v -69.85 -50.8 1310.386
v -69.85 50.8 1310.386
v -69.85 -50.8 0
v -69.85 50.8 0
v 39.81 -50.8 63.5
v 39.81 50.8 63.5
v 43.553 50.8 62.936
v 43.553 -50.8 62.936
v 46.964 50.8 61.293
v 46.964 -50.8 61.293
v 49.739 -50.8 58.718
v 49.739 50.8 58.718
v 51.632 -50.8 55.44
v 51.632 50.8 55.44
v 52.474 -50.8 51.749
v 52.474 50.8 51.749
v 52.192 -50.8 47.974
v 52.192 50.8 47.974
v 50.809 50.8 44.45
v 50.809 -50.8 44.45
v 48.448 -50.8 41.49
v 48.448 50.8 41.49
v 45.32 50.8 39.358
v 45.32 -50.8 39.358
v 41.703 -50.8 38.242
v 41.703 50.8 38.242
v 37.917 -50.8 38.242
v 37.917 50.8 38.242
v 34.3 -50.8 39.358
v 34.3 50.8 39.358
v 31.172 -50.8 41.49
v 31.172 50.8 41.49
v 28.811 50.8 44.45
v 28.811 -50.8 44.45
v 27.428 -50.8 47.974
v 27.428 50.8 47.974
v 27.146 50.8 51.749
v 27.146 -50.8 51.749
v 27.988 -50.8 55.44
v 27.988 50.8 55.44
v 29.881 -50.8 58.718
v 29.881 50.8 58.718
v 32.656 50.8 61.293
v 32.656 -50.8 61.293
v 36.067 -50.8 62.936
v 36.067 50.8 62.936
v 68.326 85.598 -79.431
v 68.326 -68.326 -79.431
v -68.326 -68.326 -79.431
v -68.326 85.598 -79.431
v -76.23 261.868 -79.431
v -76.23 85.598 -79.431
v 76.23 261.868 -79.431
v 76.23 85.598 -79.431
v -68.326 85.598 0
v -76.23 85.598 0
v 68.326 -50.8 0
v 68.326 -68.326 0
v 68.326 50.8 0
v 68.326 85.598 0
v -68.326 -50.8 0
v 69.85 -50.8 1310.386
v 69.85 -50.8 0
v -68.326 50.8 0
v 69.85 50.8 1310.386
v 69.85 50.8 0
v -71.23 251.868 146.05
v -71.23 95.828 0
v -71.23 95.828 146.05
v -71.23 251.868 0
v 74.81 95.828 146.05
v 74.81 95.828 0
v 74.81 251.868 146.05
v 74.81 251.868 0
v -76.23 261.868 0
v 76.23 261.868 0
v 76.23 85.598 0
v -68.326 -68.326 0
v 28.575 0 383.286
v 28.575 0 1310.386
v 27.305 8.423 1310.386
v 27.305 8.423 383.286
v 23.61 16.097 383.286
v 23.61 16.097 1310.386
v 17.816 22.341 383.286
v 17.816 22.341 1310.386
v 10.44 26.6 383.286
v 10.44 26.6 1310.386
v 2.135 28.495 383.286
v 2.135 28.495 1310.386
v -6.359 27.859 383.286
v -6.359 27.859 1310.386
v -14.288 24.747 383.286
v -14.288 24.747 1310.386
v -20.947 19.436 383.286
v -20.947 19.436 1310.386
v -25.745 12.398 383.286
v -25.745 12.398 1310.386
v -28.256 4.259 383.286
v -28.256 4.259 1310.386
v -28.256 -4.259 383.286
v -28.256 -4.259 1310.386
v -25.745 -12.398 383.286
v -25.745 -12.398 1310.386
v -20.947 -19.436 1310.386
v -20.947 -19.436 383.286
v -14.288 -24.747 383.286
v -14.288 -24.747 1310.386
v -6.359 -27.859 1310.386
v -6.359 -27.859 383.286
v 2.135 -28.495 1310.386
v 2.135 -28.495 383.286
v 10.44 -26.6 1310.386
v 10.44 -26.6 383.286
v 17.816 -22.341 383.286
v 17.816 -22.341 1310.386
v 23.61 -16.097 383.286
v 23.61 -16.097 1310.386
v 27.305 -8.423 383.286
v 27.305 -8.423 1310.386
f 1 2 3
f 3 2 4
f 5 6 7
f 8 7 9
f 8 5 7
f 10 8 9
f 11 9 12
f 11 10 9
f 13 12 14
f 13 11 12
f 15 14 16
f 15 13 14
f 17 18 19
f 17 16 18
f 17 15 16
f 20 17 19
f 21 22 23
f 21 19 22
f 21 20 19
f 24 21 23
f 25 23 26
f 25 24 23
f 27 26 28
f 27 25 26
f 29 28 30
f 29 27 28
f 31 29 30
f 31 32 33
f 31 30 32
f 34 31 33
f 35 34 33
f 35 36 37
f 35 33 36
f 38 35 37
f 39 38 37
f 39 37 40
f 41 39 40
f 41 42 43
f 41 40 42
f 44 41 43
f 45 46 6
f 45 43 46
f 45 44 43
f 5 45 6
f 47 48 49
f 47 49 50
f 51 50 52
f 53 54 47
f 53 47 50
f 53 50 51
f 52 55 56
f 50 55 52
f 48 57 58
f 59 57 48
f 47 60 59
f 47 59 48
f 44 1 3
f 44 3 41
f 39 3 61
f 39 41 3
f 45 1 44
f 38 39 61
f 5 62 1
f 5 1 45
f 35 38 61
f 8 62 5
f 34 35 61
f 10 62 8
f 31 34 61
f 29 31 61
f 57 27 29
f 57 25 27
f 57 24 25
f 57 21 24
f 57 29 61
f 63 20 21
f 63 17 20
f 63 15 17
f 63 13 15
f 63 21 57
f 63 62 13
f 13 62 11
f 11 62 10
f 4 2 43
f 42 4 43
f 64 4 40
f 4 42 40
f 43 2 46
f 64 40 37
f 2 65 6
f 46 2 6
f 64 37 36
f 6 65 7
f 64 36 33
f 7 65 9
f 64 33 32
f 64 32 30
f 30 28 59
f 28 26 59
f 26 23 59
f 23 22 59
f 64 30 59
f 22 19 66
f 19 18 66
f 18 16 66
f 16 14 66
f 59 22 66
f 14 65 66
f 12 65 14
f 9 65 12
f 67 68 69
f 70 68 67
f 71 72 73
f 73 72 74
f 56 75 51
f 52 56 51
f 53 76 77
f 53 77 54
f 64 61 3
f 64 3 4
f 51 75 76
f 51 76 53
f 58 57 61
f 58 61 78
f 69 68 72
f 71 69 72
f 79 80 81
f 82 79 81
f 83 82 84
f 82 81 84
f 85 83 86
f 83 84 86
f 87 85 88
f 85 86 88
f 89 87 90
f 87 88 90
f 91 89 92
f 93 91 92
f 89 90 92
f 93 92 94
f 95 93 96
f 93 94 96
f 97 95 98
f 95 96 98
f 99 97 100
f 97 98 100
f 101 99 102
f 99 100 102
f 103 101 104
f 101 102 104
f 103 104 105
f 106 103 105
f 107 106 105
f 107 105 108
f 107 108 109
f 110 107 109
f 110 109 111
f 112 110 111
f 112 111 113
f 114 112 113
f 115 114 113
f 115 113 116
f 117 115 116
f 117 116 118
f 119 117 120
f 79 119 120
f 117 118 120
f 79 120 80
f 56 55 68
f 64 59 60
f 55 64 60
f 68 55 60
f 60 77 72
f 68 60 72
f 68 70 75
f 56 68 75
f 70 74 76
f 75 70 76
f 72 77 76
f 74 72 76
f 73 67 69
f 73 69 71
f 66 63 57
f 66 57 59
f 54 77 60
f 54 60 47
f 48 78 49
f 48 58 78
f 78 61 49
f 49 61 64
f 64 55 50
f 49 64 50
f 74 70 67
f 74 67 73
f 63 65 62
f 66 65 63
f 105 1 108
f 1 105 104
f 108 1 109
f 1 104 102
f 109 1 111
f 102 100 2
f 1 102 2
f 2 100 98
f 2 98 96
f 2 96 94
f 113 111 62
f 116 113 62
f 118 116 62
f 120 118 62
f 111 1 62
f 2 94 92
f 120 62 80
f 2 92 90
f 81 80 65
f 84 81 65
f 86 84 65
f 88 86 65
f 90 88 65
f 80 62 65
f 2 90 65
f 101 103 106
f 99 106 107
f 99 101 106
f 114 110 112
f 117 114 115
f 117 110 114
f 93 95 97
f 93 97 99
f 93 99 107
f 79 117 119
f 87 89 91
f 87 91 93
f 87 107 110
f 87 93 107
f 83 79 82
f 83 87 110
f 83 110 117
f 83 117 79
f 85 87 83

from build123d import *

# Parameters (mm, degrees)
SKETCH1_W               = 1310.386
SKETCH1_H               = 101.6
BOSS_EXTRUDE1_DEPTH     = 69.85
BOSS_EXTRUDE2_DEPTH     = 68.326
SKETCH3_W               = 79.430838384
SKETCH3_H               = 176.27
BOSS_EXTRUDE3_DEPTH     = 76.23
SKETCH4_W               = 146.04
SKETCH4_H               = 156.04
BOSS_EXTRUDE4_DEPTH     = 146.05
SKETCH5_R               = 28.575
CUT_EXTRUDE1_DEPTH      = 927.1
CUT_EXTRUDE2_DEPTH      = 10
CUT_EXTRUDE2_DEPTH_BACK = 1330.46311815
SKETCH6_R               = 12.7


with BuildPart() as part:
    # Sketch1 → Boss-Extrude1 (new, symmetric)
    with BuildSketch(Plane(origin=(0, 0, 0), x_dir=(0, 0, -1), z_dir=(1, 0, 0))):
        with Locations((-655.193, 0)):
            Rectangle(SKETCH1_W, SKETCH1_H)
    extrude(amount=BOSS_EXTRUDE1_DEPTH, both=True)

    # Sketch2 → Boss-Extrude2 (add, symmetric)
    with BuildSketch(Plane(origin=(0, 0, 0), x_dir=(0, 0, -1), z_dir=(1, 0, 0))):
        Polygon((0, 0), (0, -68.326), (79.430838384, -68.326), (79.430838384, 85.598), (0, 85.598), align=None)
    extrude(amount=BOSS_EXTRUDE2_DEPTH, both=True)

    # Sketch3 → Boss-Extrude3 (add, symmetric)
    with BuildSketch(Plane(origin=(0, 0, 0), x_dir=(0, 0, -1), z_dir=(1, 0, 0))):
        with Locations((39.715419192, 173.733)):
            Rectangle(SKETCH3_W, SKETCH3_H)
    extrude(amount=BOSS_EXTRUDE3_DEPTH, both=True)

    # Sketch4 → Boss-Extrude4 (add)
    with BuildSketch(Plane.XY):
        with Locations((1.79, 173.848)):
            Rectangle(SKETCH4_W, SKETCH4_H)
    extrude(amount=BOSS_EXTRUDE4_DEPTH)

    # Sketch5 → Cut-Extrude1 (cut)
    with BuildSketch(Plane.XY.offset(1310.386)):
        Circle(SKETCH5_R)
    extrude(amount=-CUT_EXTRUDE1_DEPTH, mode=Mode.SUBTRACT)

    # Sketch6 → Cut-Extrude2 (cut, two sides: drawn at the far end of the back side and taken through both)
    with BuildSketch(Plane(origin=(0, 50.8, 0), x_dir=(1, 0, 0), z_dir=(0, 1, 0)).offset(-CUT_EXTRUDE2_DEPTH_BACK)):
        with Locations(Location((39.81, -50.8, 0), (0, 0, 270))):
            Circle(SKETCH6_R)
    extrude(amount=CUT_EXTRUDE2_DEPTH + CUT_EXTRUDE2_DEPTH_BACK, mode=Mode.SUBTRACT)


solid = part.part
